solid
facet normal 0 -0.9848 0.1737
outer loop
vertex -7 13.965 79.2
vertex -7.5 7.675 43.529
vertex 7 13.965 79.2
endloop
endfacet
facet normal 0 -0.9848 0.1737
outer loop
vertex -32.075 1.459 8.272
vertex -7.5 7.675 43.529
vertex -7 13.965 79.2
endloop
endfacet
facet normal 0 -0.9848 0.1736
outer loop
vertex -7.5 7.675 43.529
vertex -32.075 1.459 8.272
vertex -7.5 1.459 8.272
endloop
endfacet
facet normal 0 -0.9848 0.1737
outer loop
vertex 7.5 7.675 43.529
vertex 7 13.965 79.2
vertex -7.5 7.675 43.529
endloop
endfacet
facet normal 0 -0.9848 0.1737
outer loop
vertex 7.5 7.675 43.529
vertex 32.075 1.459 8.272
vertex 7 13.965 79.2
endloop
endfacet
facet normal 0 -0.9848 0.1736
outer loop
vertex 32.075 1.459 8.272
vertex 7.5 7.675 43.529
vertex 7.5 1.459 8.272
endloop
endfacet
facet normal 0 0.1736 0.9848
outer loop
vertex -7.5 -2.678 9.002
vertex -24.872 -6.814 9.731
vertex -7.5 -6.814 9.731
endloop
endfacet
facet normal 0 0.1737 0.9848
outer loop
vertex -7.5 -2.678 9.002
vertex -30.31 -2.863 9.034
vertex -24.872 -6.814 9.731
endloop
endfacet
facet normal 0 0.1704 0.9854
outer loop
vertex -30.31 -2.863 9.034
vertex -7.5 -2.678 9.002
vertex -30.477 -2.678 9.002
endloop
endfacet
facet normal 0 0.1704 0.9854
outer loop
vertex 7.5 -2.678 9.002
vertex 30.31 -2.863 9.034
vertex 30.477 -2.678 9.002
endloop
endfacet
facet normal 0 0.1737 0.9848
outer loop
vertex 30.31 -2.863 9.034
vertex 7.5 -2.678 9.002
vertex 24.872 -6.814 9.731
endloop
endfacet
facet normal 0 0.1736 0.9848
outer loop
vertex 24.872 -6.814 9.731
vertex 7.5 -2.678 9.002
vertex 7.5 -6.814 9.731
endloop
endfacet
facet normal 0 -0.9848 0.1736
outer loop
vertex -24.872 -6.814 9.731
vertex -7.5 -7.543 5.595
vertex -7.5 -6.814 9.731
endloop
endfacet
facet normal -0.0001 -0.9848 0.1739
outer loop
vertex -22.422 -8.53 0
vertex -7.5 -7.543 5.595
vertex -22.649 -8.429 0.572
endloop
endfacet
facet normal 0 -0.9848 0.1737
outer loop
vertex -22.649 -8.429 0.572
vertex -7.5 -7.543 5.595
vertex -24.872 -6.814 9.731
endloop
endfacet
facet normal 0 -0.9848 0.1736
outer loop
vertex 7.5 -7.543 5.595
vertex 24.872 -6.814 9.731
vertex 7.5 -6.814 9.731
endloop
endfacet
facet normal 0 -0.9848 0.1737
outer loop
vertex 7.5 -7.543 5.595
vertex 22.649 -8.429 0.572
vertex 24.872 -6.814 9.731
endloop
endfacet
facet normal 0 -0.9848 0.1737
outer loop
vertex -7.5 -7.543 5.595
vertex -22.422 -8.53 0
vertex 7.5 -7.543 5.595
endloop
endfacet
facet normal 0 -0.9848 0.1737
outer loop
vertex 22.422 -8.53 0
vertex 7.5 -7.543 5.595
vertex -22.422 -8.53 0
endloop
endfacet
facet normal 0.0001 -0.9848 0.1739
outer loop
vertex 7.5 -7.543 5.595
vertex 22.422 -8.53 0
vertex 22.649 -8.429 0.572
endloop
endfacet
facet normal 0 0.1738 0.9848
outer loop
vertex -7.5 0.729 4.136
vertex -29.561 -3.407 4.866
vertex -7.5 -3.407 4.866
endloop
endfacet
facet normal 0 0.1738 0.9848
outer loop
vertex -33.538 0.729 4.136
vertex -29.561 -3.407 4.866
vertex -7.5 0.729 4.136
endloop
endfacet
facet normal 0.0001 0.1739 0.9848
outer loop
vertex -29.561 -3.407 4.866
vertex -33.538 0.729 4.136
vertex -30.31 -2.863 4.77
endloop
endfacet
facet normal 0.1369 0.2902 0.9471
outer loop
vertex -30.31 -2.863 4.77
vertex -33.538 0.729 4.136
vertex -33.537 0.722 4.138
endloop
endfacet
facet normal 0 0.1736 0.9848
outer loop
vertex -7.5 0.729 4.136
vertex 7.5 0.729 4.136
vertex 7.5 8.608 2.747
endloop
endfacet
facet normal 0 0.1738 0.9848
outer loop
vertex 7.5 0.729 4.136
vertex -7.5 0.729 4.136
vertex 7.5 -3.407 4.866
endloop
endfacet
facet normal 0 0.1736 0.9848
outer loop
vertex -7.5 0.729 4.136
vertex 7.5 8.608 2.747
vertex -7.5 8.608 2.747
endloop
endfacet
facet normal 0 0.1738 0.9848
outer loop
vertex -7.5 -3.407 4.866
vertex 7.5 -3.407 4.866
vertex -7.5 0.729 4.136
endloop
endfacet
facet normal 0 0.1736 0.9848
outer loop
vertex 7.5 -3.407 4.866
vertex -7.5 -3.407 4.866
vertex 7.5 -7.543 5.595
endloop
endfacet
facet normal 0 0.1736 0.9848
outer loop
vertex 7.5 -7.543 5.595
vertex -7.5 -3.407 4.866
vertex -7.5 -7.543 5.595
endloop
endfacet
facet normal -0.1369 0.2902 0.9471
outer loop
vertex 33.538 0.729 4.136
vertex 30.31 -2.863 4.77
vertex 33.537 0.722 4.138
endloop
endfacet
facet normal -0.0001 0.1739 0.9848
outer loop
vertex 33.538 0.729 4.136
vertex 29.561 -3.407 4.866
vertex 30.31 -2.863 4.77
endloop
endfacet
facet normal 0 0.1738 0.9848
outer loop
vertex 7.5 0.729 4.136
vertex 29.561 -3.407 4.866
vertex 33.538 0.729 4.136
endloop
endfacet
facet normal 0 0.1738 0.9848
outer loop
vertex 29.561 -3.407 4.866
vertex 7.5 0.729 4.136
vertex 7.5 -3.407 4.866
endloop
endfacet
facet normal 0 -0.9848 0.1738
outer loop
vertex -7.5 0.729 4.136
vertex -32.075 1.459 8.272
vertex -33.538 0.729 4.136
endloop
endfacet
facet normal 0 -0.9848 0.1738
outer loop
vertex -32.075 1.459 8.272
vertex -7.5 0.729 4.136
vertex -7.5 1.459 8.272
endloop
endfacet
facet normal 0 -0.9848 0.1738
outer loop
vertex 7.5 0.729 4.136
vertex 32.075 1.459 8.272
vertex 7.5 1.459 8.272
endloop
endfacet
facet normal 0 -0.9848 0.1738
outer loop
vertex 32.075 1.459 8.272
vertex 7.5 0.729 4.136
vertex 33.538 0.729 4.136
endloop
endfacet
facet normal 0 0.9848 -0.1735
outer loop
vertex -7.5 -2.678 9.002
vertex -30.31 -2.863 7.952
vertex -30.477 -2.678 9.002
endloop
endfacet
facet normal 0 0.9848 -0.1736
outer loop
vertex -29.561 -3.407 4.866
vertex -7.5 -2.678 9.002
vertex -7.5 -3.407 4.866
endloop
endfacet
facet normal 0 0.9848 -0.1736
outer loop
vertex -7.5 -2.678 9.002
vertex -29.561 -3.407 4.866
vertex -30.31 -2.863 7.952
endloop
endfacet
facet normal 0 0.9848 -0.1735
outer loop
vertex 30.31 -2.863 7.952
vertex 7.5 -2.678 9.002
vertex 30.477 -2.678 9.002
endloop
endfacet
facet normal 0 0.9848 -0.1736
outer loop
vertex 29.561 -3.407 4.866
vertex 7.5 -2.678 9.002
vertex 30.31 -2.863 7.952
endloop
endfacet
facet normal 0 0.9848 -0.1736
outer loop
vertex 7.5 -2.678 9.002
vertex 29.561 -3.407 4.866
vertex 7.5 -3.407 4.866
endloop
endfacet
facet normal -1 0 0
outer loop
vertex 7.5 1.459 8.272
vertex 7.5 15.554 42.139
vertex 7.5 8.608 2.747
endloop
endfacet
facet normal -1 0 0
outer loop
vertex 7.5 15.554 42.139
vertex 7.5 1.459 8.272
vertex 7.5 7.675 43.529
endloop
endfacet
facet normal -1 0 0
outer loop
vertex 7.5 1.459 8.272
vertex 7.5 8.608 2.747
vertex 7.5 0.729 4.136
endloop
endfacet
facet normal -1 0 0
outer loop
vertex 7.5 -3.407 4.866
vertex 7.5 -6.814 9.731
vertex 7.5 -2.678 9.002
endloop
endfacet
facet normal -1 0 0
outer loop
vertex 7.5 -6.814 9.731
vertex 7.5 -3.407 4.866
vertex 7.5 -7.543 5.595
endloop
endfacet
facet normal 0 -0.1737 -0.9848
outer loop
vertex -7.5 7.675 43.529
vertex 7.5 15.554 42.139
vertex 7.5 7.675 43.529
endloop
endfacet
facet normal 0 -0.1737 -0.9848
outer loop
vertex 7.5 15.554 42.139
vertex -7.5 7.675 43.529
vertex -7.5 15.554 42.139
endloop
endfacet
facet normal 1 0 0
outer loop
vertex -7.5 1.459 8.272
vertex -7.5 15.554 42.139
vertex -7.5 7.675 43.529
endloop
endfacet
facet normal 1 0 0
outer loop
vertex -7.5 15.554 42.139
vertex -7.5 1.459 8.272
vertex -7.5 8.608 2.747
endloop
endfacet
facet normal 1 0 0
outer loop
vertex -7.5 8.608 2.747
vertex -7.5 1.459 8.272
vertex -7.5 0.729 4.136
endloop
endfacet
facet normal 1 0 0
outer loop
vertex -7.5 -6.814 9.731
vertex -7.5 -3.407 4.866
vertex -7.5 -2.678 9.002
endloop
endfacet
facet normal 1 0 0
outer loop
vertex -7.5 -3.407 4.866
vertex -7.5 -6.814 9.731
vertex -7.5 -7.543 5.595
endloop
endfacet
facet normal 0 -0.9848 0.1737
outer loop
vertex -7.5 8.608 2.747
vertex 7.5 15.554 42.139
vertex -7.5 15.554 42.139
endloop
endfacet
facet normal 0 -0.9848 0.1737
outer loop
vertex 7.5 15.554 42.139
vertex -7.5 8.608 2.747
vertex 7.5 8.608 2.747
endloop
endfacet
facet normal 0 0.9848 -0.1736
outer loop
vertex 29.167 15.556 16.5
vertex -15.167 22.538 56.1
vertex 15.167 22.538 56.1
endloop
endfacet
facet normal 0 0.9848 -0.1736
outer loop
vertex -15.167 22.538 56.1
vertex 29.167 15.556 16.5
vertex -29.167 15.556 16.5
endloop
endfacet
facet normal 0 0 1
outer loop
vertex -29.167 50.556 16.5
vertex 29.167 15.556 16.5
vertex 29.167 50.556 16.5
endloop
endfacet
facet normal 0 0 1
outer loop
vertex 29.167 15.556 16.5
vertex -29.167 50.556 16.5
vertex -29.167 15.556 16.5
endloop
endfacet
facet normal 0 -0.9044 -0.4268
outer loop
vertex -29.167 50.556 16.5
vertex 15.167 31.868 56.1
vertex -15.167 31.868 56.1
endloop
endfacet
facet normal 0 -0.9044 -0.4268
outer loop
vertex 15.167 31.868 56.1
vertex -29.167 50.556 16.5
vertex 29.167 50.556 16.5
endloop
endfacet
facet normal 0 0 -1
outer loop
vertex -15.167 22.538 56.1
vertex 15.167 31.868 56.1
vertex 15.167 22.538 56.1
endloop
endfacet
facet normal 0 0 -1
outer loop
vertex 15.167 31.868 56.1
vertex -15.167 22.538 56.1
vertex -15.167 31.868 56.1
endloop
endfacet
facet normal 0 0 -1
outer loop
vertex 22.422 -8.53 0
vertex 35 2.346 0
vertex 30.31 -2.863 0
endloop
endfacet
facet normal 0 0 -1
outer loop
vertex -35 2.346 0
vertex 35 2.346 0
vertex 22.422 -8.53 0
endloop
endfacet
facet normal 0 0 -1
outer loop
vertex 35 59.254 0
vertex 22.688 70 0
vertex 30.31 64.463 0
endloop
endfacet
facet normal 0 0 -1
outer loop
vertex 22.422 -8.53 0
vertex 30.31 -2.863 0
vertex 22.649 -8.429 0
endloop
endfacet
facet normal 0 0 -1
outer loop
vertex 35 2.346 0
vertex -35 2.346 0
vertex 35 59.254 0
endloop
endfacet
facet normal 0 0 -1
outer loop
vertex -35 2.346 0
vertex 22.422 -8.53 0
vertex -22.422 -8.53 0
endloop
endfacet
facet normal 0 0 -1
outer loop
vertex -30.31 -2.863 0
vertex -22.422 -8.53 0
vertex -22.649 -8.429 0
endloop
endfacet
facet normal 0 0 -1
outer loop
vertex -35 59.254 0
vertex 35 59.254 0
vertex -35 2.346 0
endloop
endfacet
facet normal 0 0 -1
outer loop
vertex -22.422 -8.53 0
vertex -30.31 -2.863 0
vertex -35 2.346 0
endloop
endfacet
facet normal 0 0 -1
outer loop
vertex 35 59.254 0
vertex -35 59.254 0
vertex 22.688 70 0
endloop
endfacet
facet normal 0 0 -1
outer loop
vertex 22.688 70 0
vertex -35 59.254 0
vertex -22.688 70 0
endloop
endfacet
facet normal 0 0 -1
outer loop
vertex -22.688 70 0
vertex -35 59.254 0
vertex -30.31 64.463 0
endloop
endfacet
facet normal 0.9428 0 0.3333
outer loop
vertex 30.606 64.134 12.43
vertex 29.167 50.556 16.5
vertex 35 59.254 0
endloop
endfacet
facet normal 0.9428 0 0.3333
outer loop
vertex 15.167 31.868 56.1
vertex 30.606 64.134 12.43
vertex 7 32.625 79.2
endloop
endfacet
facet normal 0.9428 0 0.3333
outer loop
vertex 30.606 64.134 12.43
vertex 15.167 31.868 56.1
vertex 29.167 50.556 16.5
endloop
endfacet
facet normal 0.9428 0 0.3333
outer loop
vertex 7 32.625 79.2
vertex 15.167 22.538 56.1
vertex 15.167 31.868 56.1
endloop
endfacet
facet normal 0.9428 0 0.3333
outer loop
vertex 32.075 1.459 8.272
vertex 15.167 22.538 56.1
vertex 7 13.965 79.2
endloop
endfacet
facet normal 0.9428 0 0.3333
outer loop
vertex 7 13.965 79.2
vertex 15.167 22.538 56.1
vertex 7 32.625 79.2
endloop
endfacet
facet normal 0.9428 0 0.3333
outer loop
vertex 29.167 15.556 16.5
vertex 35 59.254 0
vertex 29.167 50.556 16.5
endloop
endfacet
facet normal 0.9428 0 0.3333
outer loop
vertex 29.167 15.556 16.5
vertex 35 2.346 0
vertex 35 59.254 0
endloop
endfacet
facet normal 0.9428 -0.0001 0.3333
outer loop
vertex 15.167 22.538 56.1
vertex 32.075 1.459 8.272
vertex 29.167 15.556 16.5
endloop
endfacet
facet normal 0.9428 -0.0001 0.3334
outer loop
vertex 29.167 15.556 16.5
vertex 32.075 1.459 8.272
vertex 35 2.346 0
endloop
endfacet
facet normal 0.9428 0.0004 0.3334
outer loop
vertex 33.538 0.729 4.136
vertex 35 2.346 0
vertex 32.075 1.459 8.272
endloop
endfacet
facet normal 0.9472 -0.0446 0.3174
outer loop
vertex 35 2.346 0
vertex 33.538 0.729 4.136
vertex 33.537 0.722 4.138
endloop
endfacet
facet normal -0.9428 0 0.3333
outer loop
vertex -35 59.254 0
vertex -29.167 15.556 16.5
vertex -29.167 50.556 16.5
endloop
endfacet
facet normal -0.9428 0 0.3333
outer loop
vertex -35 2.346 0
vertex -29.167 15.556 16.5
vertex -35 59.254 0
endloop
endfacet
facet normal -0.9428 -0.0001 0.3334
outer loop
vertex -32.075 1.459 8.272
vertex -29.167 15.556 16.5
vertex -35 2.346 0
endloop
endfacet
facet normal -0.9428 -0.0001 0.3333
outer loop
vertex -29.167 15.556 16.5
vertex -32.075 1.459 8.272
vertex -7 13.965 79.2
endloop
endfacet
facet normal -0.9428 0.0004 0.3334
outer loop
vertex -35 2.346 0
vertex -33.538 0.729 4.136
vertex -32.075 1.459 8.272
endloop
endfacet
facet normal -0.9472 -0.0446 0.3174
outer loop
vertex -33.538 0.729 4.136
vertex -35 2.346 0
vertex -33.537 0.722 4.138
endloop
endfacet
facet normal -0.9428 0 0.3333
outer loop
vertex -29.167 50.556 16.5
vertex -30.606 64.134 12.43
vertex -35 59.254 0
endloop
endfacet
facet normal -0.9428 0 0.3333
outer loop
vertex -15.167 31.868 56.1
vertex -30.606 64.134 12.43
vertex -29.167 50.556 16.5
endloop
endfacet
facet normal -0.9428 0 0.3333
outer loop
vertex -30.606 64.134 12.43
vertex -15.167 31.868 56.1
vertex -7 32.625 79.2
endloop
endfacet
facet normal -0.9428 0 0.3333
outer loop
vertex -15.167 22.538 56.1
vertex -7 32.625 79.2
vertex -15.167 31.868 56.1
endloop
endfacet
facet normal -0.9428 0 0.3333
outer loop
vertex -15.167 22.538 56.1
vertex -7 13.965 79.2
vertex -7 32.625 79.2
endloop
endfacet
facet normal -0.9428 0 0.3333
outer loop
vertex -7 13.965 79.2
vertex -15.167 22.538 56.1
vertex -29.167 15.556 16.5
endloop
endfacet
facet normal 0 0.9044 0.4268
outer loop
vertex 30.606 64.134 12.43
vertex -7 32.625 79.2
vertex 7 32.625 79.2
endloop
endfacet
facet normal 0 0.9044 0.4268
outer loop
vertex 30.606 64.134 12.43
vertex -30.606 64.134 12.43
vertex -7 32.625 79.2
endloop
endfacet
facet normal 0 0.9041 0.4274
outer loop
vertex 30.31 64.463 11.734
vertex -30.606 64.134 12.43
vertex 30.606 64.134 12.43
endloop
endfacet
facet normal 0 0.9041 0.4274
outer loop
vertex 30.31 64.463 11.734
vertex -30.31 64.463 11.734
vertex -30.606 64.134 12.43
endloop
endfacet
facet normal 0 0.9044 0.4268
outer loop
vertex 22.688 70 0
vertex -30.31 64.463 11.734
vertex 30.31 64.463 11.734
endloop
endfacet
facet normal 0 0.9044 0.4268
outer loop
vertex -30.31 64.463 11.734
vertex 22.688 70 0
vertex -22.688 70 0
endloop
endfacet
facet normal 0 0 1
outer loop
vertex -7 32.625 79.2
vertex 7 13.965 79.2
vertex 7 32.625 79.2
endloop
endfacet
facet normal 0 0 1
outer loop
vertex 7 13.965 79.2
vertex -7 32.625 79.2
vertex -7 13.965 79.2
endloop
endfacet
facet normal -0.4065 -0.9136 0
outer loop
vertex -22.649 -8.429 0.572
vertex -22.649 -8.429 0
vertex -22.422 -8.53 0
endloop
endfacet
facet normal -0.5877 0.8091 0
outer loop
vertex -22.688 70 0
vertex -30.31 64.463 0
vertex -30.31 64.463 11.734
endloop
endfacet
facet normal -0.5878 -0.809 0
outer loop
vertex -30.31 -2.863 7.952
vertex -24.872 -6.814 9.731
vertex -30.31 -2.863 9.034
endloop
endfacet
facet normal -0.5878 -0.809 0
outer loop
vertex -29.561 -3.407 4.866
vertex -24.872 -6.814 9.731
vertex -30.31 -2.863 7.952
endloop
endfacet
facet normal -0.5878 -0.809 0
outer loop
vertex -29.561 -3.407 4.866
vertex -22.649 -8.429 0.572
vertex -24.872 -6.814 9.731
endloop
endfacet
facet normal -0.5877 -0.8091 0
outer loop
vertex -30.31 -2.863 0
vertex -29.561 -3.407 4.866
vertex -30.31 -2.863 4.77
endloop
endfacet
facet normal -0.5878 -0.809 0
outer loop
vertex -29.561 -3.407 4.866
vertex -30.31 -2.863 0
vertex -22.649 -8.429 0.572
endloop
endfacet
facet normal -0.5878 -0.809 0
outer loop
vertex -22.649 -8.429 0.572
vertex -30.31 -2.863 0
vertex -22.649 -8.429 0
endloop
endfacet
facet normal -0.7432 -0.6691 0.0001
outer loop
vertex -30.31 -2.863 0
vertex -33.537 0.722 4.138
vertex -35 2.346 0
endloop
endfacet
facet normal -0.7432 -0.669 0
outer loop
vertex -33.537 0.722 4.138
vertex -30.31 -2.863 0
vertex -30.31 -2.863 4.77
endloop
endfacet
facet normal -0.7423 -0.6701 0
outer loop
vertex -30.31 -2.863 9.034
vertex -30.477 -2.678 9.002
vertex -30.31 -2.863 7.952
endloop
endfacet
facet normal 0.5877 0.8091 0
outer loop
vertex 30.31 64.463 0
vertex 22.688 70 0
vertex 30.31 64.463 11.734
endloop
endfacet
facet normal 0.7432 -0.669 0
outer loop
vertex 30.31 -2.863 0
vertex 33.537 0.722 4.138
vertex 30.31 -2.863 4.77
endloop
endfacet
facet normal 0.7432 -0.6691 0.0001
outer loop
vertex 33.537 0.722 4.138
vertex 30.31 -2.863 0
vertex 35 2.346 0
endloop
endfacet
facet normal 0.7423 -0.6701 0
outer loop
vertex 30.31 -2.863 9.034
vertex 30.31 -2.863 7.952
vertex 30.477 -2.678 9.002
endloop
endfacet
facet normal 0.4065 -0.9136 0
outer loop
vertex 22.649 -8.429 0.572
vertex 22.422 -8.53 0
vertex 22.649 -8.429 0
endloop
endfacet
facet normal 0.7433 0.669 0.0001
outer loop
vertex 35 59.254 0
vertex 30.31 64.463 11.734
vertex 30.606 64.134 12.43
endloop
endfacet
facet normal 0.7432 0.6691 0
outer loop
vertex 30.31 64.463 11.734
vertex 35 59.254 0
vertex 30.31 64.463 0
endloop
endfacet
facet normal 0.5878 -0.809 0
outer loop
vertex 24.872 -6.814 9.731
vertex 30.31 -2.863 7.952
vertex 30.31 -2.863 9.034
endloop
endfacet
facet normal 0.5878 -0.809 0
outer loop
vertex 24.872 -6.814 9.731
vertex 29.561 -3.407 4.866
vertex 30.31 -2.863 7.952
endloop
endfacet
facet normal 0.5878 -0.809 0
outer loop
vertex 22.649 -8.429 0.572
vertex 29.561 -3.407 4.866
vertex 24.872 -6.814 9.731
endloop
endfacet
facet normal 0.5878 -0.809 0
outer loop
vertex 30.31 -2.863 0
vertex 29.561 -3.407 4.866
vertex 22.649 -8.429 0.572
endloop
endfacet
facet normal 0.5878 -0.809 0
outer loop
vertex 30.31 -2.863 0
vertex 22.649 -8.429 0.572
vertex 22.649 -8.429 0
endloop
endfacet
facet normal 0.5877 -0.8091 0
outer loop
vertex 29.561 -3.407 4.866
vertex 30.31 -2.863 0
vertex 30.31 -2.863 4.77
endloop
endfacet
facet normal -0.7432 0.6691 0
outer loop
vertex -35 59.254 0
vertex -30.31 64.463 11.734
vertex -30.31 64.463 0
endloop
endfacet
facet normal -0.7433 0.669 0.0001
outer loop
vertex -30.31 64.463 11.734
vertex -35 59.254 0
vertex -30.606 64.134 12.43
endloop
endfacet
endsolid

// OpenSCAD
// A4 clip frame stand

// Copyright (C) 2015 Jeremy Bennett <jeremy@jeremybennett.com>

// Contributor: Jeremy Bennett <jeremy@jeremybennett.com>

// This file is licensed under the Creative Commons Attribution-ShareAlike 3.0
// Unported License. To view a copy of this license, visit
// http://creativecommons.org/licenses/by-sa/3.0/ or send a letter to Creative
// Commons, PO Box 1866, Mountain View, CA 94042, USA.

// 45678901234567890123456789012345678901234567890123456789012345678901234567890


// This is a tetrahedron, with the front face 5 degrees back from vertical and
// a slot in the base for the clip.  We build it as a cube, tilt it, then
// slice bits off to make the tetrahedron.


// Base dimensions
WIDTH  = 210.0;                         // Frame width
HEIGHT = 297.0;                         // Frame depth
DEPTH  =   3.5;                         // Frame thickness

TILT = 10;                              // How much to tilt back

CLIP_W = 15;                            // Clip width
CLIP_H = 40;                            // Clip height
CLIP_D =  8;                            // Clip depth

// Derived dimensions
base_w = WIDTH / 3;
base_h = HEIGHT / 3;
base_d = base_w;

clear_d = DEPTH * 1.2;                  // Allow some play in frame thickness


// The basic cube with a ledge. Face is on X-Z plane, base is on X-Y plane,
// face centered on Y-Z plane, with ledge sticking forward

module base_holder () {
   // Dimensions for the ledge
   ledge_w = base_w;
   ledge_h = clear_d * 2;
   ledge_d = ledge_h;

   // Dimensions for groove in the ledge
   groove_w = ledge_w;
   groove_h = clear_d;
   groove_d = groove_h;

   difference () {
      union () {
         // The base cube
         translate (v = [-base_w / 2, 0, 0])
            cube (size = [base_w, base_d, base_h], center = false);
         // Ledge allow to extend below, to allow for tilt
         translate (v = [-ledge_w / 2, -ledge_d, -ledge_h])
            cube (size = [ledge_w, ledge_d, ledge_h * 2], center = false);
      }

      // Groove in the ledge
      translate (v = [-groove_w / 2, -groove_d, ledge_h - groove_h])
         cube (size = [groove_w, groove_d, groove_h], center = false);

      // Slot for clip. Also extends below to allow for tilt
      translate (v = [-CLIP_W / 2, -base_d + CLIP_D, groove_h])
         cube (size = [CLIP_W, base_d, CLIP_H], center = false);
   }
}


// A cube rotated around Y to slice off the side.

// @param  direction  Which direction to rotate.
module side_slice (direction) {
   // Amount to tilt to ensure meeting at the top
   angle = direction * atan ((base_w / 2) / base_h);
   rotate (a = [0, angle, 0])
      translate (v = [-direction * base_w / 2, 0, 0])
         cube (size = [base_w, base_d * 4, base_h * 4], center = true);
}


// A cube rotated around X to slice off the back
module back_slice () {
   // Amount to tilt to ensure meeting at the top
   angle = atan (base_d / base_h) - TILT;
   rotate (a = [angle, 0, 0])
      translate (v = [0, base_d, 0])
         cube (size = [base_w * 2, base_d * 2, base_h * 4], center = true);
}


// A triangular prism for slicing out of the middle
module triangular_prism () {
   prism_w = base_w * 2;
   prism_h = base_h / 2;
   prism_d = base_w / 2;
   sliced_height = prism_h * 0.8;

   difference () {
      rotate (a = [-TILT, 0, 0])
         translate (v = [-prism_w / 2, 0, 0])
            cube (size = [prism_w, prism_d, prism_h], center = false);

      // Subtract cube for the base
      translate (v = [-base_w, 0, -base_h])
         cube (size = [base_w * 2, base_d * 2, base_h], center = false);

      // Subtract cube for the back
      translate (v = [0, prism_d, 0])
         back_slice ();

      // Cube to slice off to top
      translate (v = [-prism_w / 2, 0, sliced_height])
         cube (size = [prism_w, prism_d, prism_h], center = false);
   }
}


// The full holder

// The base is tipped back, then triangles are cut away.  And have a flat top,
// because printing a point is a bad idea.

// To save weight, we take a triangular prism out of the centre.

module full_holder () {
   sliced_height = base_h * 0.8;

   difference () {
      rotate (a = [-TILT, 0, 0])
         base_holder ();

      // Cube to slice the base. Ensure wide enough
      translate (v = [-base_w, -base_d * 2, -base_h])
         cube (size = [base_w * 2, base_d * 4, base_h], center = false);

      // Cubes to slice off the sides
      translate (v = [base_w / 2, 0, 0])
         side_slice (-1);
      translate (v = [-base_w / 2, 0, 0])
         side_slice (+1);

      // Cube to slice off the back
      translate (v = [0, base_d, 0])
         back_slice ();

      // Cube to slice off to top
      translate (v = [-base_w / 2, 0, sliced_height])
         cube (size = [base_w, base_d, base_h], center = false);

      // Triangular prism to save weight
      translate (v = [0, base_d / 4.5, base_h / 6])
         triangular_prism ();
   }
}


// Finally we add some curves to the corners
module holder () {
   o = base_w / 2;
   a = (base_d) / 2;
   cyl_rad = sqrt (o * o + a * a) - clear_d;
   intersection () {
      full_holder ();
      translate (v = [0, base_d / 2 - clear_d, 0])
         cylinder (r = cyl_rad, h = base_h);
   }
}


// Print out the base
holder ();
